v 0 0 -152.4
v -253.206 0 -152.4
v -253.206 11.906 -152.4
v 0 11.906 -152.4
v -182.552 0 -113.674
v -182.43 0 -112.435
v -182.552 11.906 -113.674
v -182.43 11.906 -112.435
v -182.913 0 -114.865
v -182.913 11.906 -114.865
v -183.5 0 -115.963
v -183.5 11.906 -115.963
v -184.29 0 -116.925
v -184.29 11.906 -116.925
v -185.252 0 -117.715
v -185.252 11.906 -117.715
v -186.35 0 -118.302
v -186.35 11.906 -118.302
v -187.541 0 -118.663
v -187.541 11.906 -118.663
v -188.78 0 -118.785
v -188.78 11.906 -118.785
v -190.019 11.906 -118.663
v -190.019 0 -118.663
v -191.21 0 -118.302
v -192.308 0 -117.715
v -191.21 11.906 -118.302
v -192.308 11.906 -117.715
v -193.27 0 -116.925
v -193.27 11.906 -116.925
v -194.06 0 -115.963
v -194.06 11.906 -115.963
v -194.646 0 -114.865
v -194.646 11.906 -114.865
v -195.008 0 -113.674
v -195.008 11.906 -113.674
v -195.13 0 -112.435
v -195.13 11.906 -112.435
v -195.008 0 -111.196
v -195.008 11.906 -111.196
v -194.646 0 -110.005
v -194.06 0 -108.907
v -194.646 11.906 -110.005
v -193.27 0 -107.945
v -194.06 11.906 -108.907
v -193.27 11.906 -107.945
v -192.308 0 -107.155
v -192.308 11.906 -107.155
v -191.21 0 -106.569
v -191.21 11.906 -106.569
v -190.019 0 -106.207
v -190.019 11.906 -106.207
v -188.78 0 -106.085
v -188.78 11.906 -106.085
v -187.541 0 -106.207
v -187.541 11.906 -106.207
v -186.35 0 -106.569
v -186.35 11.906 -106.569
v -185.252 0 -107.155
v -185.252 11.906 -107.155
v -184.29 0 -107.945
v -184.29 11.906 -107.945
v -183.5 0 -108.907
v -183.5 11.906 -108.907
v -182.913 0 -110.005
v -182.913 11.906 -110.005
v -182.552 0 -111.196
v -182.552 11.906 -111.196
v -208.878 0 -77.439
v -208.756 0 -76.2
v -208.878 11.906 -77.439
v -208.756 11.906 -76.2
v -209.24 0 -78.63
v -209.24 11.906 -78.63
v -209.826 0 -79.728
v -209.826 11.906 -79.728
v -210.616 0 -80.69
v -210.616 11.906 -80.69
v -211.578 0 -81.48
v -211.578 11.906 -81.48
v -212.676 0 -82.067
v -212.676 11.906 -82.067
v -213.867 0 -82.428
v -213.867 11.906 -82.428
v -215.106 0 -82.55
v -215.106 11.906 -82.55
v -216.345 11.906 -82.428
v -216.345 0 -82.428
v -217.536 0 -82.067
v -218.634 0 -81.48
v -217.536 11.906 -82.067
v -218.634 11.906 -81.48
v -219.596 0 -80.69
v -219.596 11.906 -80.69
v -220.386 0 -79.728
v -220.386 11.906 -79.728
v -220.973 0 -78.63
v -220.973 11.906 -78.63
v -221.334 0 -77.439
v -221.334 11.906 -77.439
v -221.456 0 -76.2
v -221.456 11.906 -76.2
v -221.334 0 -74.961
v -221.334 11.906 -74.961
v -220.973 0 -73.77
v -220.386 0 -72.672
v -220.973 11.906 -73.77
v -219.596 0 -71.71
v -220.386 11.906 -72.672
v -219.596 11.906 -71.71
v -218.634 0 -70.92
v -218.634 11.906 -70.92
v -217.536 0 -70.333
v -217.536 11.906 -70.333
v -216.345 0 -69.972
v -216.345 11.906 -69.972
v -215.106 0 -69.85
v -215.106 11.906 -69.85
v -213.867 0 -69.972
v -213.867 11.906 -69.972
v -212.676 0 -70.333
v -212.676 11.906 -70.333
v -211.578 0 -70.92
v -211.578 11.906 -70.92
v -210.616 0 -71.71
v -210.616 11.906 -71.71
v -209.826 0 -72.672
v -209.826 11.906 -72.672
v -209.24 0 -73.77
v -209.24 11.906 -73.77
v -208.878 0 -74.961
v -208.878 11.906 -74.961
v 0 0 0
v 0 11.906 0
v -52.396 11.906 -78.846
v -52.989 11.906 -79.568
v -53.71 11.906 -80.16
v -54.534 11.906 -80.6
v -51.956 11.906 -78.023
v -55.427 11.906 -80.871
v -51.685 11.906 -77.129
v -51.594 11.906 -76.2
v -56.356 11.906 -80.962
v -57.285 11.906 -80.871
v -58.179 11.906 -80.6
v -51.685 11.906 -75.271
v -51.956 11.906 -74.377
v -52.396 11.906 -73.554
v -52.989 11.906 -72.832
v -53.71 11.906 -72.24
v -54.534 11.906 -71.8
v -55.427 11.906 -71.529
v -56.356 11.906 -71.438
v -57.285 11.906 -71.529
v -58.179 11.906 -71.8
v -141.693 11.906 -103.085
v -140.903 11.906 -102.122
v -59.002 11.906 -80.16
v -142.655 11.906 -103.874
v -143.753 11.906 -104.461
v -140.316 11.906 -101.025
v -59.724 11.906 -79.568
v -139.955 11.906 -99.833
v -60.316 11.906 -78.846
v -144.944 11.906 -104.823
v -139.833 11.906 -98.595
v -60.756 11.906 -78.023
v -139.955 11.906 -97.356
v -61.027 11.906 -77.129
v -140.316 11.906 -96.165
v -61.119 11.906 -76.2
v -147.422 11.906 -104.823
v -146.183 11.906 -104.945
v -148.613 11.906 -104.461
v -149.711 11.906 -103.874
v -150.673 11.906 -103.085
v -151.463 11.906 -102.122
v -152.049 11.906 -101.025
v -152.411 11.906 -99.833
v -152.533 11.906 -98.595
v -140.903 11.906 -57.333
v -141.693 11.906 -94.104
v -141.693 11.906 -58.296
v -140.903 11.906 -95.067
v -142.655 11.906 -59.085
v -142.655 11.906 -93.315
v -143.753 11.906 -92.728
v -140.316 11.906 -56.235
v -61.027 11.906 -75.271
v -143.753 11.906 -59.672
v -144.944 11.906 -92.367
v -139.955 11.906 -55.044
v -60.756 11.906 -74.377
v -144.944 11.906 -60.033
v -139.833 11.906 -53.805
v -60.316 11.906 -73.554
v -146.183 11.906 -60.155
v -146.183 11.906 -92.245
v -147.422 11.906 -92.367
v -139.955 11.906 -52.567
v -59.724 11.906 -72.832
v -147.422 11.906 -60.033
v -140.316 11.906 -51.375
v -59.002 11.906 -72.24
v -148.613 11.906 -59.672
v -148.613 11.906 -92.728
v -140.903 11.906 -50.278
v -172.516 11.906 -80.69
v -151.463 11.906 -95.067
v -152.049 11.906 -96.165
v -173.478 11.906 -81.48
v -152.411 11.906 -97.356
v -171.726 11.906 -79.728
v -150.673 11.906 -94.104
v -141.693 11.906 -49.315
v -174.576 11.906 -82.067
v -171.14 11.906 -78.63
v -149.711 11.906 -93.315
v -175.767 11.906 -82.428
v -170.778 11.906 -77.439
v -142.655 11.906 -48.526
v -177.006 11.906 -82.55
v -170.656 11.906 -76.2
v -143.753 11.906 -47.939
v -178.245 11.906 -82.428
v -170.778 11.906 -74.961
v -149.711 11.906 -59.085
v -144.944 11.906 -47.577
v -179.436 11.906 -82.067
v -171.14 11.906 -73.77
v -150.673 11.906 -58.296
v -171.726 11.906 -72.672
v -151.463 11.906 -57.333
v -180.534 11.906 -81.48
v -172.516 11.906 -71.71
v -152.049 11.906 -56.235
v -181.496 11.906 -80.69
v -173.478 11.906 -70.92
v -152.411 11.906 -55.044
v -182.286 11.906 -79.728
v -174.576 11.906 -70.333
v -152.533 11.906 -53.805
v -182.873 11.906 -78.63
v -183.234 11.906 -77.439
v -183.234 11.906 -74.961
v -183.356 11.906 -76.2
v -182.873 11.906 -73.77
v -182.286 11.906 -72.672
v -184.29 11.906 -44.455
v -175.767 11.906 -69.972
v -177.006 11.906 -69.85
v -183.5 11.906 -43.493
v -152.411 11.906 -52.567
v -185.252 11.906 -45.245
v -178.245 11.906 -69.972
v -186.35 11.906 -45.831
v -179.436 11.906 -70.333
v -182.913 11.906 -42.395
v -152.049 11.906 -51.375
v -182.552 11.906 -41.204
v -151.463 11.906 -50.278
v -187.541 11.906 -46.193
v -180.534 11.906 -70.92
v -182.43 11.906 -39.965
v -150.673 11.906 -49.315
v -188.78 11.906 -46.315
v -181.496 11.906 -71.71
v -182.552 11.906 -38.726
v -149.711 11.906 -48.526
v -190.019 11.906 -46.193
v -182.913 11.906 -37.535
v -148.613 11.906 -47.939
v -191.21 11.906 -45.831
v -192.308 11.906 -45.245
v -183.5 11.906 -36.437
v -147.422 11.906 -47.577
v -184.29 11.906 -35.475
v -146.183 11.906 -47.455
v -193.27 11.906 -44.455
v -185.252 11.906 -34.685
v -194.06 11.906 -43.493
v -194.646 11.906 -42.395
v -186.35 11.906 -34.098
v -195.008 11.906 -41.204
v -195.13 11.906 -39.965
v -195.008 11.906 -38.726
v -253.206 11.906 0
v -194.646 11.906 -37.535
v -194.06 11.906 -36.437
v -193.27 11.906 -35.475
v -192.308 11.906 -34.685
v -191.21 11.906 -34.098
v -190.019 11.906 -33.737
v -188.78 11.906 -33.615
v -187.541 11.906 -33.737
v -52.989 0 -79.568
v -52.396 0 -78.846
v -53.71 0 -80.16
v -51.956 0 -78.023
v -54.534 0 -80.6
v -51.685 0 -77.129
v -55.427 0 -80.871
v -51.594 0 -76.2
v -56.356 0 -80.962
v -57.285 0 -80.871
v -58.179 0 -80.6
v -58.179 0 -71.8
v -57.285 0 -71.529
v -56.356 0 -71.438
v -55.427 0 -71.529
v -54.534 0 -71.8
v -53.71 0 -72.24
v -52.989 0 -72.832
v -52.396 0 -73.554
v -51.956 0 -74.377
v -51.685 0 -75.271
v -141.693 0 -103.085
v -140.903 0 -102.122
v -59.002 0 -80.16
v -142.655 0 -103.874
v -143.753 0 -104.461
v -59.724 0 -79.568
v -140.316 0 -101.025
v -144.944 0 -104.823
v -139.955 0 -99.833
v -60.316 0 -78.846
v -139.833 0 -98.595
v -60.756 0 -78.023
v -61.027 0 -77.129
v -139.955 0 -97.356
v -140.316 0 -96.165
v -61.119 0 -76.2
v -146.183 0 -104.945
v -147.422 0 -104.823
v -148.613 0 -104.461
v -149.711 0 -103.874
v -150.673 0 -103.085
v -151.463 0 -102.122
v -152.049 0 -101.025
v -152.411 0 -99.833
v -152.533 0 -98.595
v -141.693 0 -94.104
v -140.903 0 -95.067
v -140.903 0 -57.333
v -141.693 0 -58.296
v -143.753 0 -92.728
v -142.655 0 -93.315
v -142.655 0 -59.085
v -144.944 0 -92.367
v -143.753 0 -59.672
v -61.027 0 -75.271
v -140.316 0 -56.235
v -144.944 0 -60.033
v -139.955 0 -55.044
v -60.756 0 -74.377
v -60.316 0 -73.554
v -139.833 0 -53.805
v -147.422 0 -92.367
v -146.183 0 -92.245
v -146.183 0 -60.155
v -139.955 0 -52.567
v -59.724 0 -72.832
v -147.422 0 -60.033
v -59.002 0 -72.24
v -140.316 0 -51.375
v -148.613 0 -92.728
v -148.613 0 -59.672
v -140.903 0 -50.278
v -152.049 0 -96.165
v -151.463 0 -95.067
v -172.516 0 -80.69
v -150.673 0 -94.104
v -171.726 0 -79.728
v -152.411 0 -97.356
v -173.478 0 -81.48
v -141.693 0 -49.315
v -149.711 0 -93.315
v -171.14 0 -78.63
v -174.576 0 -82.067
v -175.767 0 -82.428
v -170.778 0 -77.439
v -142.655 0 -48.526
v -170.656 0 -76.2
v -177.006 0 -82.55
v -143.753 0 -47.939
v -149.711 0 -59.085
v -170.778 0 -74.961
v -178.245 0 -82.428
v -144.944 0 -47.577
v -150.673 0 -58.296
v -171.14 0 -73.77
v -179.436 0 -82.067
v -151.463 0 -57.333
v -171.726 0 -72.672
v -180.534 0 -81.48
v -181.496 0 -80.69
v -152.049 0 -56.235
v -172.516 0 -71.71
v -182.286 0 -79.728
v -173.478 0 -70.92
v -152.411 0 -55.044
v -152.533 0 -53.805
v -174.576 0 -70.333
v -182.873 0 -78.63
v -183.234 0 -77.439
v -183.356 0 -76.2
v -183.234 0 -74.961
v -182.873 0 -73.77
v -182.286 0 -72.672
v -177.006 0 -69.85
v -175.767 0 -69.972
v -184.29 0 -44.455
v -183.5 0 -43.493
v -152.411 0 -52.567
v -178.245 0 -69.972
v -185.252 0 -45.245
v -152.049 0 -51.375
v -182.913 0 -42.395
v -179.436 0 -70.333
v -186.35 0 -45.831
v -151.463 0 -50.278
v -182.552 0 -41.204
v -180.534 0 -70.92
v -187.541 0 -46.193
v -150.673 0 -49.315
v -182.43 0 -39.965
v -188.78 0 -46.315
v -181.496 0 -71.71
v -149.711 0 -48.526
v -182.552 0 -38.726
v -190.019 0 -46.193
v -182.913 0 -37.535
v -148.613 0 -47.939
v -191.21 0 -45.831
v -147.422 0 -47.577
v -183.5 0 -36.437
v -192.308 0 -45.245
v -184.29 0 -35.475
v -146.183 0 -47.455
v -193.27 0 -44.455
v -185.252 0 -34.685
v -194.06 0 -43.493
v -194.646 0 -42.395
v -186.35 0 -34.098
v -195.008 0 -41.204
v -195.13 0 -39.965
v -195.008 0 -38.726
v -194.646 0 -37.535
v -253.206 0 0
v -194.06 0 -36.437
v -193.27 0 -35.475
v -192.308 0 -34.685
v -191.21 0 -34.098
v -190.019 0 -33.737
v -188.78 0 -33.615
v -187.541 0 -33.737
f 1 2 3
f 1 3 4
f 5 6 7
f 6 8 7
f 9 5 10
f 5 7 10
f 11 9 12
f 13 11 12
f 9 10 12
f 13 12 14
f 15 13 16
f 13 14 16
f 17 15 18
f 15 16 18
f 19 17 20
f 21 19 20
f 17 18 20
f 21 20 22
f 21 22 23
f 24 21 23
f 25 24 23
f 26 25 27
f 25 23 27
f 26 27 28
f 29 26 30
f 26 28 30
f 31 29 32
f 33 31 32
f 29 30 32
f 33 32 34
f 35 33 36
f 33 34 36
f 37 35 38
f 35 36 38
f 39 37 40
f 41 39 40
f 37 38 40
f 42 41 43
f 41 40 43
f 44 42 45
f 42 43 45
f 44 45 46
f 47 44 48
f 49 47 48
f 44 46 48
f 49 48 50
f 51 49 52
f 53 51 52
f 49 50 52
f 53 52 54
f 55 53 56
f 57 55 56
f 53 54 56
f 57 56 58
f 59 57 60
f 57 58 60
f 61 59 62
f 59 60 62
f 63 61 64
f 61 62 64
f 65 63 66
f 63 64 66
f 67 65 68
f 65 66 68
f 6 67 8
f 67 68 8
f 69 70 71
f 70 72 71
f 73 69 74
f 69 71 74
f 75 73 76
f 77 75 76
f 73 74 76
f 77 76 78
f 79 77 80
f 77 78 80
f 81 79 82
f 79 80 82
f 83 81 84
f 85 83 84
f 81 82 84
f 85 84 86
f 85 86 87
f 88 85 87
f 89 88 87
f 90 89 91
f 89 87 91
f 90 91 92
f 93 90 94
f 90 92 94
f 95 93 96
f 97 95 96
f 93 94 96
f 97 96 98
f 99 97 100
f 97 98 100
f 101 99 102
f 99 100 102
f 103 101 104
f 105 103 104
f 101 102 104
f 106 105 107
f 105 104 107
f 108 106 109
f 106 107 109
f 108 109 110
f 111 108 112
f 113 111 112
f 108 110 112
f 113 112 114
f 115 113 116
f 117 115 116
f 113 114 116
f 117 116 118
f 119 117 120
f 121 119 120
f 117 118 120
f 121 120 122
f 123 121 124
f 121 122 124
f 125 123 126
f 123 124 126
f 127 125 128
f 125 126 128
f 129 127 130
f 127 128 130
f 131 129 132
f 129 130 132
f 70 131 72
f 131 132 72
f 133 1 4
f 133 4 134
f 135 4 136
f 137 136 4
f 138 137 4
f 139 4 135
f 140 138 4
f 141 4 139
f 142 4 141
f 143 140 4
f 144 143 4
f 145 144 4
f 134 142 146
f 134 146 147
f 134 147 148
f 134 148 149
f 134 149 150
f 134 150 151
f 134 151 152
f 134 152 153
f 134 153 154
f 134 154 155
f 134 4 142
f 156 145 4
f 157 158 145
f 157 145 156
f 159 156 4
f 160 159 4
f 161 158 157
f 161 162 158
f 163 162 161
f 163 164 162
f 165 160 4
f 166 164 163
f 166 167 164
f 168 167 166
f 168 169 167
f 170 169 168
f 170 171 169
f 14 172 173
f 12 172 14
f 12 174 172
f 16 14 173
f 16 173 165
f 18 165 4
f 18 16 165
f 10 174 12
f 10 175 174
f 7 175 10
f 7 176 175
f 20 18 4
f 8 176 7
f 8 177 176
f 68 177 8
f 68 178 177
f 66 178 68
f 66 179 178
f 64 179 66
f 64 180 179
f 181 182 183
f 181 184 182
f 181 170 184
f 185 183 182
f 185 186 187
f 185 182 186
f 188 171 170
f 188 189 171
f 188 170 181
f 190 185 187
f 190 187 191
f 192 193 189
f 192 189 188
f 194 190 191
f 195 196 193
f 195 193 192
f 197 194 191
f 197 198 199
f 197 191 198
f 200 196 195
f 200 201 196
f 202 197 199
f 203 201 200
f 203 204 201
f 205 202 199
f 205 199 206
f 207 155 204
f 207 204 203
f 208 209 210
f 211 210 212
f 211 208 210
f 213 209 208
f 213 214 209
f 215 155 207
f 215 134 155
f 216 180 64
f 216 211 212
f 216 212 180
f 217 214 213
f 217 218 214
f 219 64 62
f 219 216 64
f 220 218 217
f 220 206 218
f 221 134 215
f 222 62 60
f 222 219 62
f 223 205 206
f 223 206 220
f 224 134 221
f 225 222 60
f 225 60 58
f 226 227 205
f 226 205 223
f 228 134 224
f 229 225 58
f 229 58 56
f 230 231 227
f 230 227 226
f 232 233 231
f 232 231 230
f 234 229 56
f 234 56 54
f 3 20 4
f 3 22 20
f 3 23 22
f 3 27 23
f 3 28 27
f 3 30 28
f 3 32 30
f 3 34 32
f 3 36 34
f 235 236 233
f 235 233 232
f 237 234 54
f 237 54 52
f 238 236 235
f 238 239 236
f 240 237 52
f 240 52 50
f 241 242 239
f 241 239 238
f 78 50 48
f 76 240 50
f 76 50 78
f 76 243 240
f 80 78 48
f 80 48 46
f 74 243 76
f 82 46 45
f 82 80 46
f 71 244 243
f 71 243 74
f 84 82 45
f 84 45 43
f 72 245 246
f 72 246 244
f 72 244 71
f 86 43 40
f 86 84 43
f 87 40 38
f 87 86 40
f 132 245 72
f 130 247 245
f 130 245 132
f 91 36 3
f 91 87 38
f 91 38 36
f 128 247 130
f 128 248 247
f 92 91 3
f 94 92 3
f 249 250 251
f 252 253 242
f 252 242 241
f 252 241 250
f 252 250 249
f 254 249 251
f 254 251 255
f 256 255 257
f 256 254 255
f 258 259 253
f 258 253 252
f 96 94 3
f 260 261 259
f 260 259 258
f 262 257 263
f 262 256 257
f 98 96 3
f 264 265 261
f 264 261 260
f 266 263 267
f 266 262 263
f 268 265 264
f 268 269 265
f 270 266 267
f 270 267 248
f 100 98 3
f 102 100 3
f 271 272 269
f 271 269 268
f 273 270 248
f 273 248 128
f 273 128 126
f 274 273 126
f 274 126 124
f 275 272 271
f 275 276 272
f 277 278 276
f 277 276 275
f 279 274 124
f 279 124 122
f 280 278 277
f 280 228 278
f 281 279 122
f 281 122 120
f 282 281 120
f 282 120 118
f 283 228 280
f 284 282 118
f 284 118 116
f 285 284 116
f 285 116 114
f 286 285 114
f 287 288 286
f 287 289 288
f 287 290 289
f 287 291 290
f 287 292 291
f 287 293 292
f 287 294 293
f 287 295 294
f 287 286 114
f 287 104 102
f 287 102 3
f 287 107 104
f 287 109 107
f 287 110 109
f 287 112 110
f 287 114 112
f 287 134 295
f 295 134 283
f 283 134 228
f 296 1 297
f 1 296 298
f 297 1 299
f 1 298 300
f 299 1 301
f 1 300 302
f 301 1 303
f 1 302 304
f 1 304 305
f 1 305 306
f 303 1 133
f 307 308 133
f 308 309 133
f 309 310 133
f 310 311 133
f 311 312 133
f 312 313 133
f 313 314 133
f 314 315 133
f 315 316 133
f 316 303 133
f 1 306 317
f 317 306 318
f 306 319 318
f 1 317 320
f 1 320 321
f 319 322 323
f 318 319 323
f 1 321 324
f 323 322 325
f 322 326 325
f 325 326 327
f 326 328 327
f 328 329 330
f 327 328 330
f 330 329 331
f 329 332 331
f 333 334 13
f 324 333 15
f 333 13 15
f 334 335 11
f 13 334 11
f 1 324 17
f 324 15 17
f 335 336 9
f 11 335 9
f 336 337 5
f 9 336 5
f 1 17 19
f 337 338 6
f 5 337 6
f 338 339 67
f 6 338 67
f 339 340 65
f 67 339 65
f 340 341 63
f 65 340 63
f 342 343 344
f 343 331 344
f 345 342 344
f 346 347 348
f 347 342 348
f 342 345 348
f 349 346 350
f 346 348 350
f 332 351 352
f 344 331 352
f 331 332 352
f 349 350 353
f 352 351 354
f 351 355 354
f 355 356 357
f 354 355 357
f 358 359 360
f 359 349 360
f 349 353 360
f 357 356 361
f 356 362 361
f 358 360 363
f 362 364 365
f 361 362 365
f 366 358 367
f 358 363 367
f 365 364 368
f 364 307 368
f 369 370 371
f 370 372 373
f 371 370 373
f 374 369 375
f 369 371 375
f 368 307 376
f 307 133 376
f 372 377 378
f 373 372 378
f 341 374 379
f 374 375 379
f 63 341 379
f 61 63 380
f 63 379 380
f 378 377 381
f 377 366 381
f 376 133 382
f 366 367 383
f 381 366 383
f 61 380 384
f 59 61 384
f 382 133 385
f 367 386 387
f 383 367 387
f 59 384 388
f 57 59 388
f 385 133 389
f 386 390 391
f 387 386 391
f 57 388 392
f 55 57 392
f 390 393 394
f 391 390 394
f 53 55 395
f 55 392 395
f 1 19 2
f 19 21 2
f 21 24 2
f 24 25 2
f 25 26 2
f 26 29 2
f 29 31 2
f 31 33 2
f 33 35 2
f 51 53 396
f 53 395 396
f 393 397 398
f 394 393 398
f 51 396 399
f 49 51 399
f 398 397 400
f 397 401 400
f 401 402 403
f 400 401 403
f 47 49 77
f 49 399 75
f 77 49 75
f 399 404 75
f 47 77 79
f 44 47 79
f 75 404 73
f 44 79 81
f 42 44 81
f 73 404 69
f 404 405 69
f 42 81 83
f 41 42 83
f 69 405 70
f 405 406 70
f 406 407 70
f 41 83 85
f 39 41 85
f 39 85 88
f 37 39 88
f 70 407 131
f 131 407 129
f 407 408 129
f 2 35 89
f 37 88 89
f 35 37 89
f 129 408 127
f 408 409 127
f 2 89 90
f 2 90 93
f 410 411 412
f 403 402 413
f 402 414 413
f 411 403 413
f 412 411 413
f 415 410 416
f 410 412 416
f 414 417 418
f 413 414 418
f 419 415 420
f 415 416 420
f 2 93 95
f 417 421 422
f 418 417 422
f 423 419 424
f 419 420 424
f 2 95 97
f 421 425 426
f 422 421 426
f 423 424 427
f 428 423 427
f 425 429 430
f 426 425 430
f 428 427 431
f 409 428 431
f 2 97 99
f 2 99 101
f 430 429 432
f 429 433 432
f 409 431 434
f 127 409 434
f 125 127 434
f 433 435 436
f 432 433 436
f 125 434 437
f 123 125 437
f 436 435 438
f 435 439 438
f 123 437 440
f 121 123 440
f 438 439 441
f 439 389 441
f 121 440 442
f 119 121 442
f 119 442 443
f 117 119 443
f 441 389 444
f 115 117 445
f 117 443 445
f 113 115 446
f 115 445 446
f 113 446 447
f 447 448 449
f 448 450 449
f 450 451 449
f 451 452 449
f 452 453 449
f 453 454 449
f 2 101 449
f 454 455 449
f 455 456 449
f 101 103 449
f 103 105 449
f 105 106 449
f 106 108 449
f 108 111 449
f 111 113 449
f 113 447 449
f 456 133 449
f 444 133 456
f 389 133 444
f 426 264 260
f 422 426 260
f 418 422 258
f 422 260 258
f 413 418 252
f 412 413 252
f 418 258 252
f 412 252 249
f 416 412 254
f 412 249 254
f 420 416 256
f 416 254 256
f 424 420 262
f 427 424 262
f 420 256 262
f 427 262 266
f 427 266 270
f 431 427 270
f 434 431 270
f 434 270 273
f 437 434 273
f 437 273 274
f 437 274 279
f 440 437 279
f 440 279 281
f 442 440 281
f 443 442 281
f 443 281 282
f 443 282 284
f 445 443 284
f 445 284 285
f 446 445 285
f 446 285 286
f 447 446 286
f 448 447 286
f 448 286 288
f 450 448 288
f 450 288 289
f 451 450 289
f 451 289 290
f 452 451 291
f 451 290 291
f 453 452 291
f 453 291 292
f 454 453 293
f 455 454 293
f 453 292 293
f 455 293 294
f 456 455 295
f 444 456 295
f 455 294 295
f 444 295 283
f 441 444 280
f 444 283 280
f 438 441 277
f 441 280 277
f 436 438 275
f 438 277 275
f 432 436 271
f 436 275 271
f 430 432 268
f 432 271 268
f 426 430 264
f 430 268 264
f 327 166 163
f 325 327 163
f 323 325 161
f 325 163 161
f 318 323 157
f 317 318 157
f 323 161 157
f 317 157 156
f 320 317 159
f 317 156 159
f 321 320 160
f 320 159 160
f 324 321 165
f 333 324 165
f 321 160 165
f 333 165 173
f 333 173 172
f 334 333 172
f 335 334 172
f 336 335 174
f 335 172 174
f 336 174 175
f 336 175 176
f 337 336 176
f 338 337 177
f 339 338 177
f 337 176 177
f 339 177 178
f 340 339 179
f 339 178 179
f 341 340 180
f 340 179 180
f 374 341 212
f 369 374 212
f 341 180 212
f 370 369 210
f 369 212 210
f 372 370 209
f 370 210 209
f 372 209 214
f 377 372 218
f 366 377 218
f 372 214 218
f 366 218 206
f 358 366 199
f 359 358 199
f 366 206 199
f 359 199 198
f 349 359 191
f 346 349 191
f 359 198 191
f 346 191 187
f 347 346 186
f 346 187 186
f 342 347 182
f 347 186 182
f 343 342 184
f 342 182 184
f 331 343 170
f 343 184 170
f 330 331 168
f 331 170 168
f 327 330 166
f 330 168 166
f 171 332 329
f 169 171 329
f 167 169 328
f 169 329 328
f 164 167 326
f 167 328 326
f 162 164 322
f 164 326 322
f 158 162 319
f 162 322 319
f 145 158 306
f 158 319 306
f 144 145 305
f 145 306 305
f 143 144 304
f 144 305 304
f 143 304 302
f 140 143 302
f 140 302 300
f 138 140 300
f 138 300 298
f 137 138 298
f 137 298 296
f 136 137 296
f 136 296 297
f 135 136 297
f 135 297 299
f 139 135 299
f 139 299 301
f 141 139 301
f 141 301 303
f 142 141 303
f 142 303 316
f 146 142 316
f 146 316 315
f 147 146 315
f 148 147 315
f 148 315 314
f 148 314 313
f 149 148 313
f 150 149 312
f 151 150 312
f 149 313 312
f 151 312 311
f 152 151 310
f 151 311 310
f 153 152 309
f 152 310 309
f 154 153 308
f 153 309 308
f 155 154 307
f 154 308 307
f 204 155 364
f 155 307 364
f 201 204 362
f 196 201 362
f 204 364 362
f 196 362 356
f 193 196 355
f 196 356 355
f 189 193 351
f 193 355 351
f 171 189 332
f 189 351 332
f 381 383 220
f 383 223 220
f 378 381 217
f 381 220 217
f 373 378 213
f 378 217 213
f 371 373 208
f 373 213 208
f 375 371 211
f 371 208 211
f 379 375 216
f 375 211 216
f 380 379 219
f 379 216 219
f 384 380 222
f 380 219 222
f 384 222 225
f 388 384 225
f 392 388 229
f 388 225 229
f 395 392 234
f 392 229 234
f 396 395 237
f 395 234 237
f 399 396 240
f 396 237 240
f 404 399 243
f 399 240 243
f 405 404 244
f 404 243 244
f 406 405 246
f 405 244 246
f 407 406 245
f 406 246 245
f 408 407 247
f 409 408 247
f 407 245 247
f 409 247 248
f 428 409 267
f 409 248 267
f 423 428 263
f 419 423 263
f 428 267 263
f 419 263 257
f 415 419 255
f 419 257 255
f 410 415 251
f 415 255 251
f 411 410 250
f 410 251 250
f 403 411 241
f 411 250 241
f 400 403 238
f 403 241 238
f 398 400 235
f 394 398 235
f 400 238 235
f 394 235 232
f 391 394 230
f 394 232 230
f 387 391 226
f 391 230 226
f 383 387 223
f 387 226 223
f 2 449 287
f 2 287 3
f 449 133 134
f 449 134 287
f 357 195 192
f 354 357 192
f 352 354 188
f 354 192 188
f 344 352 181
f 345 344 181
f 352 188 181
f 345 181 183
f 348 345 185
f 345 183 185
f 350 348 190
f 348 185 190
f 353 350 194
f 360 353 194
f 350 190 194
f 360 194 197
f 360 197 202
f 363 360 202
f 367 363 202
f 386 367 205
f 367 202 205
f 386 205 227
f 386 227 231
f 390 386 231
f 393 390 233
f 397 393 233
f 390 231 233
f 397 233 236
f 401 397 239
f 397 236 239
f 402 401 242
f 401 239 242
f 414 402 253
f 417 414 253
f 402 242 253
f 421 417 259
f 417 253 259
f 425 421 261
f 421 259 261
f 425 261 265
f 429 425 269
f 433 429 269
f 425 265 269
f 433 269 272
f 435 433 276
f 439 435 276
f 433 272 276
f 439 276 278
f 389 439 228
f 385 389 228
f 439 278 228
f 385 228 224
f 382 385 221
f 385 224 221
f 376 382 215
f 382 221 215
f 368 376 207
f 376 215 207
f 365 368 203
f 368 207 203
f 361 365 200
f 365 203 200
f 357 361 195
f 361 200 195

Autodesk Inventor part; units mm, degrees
ref_plane "YZ Plane" through (0, 0, 0) normal (1, 0, 0) x (0, 1, 0)
ref_plane "XZ Plane" through (0, 0, 0) normal (0, 1, 0) x (-1, 0, 0)
ref_plane "XY Plane" through (0, 0, 0) normal (0, 0, 1) x (1, 0, 0)
sketch "Sketch1" plane through (0, 0, 0) normal (0, 1, 0) x (-1, 0, 0)
  line L0 (0, 0) -> (253.2063, 0)
  line L1 (253.2063, 0) -> (253.2063, -152.4)
  line L2 (253.2063, -152.4) -> (0, -152.4)
  line L3 (0, -152.4) -> (0, 0)
  line L4 (0, -76.2) -> (56.3563, -76.2)
  circle A0 centre (56.3563, -76.2) radius 4.7625
  dimension "d0" = 152.4
  dimension "d1" = 253.2063
  dimension "d2" = 56.3563
  dimension "d3" = 9.525
extrude "Extrusion1" add sketch "Sketch1" along normal blind 11.9062
sketch "Sketch2" plane through (0, 11.9062, 0) normal (0, 1, 0) x (1, 0, 0)
  line L0 (0, 0) -> (0, 152.4) projected
  line L1 (0, 76.2) -> (-177.0063, 76.2)
  circle A0 centre (-177.0063, 76.2) radius 6.35
  line L2 (-177.0063, 76.2) -> (-215.1063, 76.2)
  circle A1 centre (-215.1063, 76.2) radius 6.35
  circle A2 centre (-188.7798, 39.9647) radius 6.35
  circle A3 centre (-146.1827, 53.8054) radius 6.35
  circle A4 centre (-146.1827, 98.5946) radius 6.35
  circle A5 centre (-188.7798, 112.4353) radius 6.35
  dimension "d6" = 12.7
  dimension "d7" = 38.1
  dimension "d8" = 12.7
  dimension "d11" = 360
  dimension "d13" = 177.0062
extrude "Extrusion2" cut sketch "Sketch2" against normal blind 11.9062
properties part number "Stage3Wall" material "Wood (Birch)"
